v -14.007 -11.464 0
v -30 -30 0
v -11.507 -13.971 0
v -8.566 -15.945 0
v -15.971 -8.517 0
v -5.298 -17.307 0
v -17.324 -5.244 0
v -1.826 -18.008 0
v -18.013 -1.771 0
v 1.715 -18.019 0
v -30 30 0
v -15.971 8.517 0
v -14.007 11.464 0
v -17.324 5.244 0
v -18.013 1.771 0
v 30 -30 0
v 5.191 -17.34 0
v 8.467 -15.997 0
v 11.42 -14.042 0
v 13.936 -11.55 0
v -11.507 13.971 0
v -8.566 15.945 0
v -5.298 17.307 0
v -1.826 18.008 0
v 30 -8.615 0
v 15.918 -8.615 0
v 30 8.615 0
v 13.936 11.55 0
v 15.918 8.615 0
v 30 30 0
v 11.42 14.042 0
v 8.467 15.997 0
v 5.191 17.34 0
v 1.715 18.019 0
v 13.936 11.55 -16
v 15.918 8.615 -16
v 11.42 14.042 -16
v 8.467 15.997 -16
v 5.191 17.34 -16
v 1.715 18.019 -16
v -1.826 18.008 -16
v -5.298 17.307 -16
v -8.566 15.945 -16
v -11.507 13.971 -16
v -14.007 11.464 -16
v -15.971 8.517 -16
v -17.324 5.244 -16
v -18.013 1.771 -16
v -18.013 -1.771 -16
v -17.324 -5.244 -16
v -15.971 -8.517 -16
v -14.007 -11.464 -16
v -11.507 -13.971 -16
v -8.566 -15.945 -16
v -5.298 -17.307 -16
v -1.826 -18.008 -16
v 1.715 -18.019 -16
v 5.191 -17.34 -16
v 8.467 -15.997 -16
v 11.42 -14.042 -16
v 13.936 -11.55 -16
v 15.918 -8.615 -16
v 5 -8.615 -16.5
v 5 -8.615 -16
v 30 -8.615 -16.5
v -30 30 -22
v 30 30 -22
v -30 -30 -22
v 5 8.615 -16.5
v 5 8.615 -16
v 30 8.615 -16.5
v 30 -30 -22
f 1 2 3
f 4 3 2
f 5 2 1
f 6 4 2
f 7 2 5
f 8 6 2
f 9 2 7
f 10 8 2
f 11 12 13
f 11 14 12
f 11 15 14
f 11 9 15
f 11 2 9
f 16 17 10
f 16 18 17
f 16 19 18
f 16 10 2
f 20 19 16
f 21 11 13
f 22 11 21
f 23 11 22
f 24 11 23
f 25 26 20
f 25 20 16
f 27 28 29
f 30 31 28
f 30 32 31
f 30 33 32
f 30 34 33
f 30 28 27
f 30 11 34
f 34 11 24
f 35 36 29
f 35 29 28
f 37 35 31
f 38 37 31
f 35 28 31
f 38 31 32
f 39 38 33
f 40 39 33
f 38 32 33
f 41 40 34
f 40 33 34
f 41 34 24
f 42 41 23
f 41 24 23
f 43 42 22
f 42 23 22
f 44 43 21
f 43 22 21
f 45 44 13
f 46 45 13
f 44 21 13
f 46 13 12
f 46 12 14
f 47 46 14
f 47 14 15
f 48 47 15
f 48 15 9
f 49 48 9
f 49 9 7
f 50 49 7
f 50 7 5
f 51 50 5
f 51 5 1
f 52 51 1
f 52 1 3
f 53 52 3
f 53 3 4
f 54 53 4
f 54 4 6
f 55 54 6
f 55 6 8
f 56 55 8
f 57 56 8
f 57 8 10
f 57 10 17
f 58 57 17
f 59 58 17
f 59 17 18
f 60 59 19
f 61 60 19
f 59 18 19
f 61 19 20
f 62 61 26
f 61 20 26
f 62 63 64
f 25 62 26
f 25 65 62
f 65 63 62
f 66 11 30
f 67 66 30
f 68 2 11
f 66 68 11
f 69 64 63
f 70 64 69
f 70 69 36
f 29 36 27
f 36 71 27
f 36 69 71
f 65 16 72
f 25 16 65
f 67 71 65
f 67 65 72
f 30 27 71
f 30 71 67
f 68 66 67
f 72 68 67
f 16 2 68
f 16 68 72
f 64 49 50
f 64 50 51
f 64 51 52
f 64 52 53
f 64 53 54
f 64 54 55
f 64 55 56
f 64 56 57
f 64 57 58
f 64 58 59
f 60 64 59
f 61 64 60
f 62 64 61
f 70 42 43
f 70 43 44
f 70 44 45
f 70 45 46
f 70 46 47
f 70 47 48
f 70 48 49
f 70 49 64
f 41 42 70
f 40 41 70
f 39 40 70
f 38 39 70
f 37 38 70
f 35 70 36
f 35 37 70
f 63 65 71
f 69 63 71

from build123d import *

# Parameters (mm, degrees)
F0_W     = 60
F0_H     = 60
F1_DEPTH = 22
F2_R     = 18.1
F3_DEPTH = 16
F4_W     = 17.230908
F4_H     = 16.499999
F5_DEPTH = 25


with BuildPart() as f1:
    # F0 (on Top) → F1 (new body)
    with BuildSketch(Plane.XY):
        Rectangle(F0_W, F0_H)
    extrude(amount=-F1_DEPTH)

    # F2 (on face) → F3 (cut)
    with BuildSketch(Plane.XY):
        Circle(F2_R)
    extrude(amount=-F3_DEPTH, mode=Mode.SUBTRACT)

    # F4 (on face) → F5 (cut)
    with BuildSketch(Plane.YZ.offset(30)):
        with Locations((0, -8.249999)):
            Rectangle(F4_W, F4_H)
    extrude(amount=-F5_DEPTH, mode=Mode.SUBTRACT)


solid = f1.part
